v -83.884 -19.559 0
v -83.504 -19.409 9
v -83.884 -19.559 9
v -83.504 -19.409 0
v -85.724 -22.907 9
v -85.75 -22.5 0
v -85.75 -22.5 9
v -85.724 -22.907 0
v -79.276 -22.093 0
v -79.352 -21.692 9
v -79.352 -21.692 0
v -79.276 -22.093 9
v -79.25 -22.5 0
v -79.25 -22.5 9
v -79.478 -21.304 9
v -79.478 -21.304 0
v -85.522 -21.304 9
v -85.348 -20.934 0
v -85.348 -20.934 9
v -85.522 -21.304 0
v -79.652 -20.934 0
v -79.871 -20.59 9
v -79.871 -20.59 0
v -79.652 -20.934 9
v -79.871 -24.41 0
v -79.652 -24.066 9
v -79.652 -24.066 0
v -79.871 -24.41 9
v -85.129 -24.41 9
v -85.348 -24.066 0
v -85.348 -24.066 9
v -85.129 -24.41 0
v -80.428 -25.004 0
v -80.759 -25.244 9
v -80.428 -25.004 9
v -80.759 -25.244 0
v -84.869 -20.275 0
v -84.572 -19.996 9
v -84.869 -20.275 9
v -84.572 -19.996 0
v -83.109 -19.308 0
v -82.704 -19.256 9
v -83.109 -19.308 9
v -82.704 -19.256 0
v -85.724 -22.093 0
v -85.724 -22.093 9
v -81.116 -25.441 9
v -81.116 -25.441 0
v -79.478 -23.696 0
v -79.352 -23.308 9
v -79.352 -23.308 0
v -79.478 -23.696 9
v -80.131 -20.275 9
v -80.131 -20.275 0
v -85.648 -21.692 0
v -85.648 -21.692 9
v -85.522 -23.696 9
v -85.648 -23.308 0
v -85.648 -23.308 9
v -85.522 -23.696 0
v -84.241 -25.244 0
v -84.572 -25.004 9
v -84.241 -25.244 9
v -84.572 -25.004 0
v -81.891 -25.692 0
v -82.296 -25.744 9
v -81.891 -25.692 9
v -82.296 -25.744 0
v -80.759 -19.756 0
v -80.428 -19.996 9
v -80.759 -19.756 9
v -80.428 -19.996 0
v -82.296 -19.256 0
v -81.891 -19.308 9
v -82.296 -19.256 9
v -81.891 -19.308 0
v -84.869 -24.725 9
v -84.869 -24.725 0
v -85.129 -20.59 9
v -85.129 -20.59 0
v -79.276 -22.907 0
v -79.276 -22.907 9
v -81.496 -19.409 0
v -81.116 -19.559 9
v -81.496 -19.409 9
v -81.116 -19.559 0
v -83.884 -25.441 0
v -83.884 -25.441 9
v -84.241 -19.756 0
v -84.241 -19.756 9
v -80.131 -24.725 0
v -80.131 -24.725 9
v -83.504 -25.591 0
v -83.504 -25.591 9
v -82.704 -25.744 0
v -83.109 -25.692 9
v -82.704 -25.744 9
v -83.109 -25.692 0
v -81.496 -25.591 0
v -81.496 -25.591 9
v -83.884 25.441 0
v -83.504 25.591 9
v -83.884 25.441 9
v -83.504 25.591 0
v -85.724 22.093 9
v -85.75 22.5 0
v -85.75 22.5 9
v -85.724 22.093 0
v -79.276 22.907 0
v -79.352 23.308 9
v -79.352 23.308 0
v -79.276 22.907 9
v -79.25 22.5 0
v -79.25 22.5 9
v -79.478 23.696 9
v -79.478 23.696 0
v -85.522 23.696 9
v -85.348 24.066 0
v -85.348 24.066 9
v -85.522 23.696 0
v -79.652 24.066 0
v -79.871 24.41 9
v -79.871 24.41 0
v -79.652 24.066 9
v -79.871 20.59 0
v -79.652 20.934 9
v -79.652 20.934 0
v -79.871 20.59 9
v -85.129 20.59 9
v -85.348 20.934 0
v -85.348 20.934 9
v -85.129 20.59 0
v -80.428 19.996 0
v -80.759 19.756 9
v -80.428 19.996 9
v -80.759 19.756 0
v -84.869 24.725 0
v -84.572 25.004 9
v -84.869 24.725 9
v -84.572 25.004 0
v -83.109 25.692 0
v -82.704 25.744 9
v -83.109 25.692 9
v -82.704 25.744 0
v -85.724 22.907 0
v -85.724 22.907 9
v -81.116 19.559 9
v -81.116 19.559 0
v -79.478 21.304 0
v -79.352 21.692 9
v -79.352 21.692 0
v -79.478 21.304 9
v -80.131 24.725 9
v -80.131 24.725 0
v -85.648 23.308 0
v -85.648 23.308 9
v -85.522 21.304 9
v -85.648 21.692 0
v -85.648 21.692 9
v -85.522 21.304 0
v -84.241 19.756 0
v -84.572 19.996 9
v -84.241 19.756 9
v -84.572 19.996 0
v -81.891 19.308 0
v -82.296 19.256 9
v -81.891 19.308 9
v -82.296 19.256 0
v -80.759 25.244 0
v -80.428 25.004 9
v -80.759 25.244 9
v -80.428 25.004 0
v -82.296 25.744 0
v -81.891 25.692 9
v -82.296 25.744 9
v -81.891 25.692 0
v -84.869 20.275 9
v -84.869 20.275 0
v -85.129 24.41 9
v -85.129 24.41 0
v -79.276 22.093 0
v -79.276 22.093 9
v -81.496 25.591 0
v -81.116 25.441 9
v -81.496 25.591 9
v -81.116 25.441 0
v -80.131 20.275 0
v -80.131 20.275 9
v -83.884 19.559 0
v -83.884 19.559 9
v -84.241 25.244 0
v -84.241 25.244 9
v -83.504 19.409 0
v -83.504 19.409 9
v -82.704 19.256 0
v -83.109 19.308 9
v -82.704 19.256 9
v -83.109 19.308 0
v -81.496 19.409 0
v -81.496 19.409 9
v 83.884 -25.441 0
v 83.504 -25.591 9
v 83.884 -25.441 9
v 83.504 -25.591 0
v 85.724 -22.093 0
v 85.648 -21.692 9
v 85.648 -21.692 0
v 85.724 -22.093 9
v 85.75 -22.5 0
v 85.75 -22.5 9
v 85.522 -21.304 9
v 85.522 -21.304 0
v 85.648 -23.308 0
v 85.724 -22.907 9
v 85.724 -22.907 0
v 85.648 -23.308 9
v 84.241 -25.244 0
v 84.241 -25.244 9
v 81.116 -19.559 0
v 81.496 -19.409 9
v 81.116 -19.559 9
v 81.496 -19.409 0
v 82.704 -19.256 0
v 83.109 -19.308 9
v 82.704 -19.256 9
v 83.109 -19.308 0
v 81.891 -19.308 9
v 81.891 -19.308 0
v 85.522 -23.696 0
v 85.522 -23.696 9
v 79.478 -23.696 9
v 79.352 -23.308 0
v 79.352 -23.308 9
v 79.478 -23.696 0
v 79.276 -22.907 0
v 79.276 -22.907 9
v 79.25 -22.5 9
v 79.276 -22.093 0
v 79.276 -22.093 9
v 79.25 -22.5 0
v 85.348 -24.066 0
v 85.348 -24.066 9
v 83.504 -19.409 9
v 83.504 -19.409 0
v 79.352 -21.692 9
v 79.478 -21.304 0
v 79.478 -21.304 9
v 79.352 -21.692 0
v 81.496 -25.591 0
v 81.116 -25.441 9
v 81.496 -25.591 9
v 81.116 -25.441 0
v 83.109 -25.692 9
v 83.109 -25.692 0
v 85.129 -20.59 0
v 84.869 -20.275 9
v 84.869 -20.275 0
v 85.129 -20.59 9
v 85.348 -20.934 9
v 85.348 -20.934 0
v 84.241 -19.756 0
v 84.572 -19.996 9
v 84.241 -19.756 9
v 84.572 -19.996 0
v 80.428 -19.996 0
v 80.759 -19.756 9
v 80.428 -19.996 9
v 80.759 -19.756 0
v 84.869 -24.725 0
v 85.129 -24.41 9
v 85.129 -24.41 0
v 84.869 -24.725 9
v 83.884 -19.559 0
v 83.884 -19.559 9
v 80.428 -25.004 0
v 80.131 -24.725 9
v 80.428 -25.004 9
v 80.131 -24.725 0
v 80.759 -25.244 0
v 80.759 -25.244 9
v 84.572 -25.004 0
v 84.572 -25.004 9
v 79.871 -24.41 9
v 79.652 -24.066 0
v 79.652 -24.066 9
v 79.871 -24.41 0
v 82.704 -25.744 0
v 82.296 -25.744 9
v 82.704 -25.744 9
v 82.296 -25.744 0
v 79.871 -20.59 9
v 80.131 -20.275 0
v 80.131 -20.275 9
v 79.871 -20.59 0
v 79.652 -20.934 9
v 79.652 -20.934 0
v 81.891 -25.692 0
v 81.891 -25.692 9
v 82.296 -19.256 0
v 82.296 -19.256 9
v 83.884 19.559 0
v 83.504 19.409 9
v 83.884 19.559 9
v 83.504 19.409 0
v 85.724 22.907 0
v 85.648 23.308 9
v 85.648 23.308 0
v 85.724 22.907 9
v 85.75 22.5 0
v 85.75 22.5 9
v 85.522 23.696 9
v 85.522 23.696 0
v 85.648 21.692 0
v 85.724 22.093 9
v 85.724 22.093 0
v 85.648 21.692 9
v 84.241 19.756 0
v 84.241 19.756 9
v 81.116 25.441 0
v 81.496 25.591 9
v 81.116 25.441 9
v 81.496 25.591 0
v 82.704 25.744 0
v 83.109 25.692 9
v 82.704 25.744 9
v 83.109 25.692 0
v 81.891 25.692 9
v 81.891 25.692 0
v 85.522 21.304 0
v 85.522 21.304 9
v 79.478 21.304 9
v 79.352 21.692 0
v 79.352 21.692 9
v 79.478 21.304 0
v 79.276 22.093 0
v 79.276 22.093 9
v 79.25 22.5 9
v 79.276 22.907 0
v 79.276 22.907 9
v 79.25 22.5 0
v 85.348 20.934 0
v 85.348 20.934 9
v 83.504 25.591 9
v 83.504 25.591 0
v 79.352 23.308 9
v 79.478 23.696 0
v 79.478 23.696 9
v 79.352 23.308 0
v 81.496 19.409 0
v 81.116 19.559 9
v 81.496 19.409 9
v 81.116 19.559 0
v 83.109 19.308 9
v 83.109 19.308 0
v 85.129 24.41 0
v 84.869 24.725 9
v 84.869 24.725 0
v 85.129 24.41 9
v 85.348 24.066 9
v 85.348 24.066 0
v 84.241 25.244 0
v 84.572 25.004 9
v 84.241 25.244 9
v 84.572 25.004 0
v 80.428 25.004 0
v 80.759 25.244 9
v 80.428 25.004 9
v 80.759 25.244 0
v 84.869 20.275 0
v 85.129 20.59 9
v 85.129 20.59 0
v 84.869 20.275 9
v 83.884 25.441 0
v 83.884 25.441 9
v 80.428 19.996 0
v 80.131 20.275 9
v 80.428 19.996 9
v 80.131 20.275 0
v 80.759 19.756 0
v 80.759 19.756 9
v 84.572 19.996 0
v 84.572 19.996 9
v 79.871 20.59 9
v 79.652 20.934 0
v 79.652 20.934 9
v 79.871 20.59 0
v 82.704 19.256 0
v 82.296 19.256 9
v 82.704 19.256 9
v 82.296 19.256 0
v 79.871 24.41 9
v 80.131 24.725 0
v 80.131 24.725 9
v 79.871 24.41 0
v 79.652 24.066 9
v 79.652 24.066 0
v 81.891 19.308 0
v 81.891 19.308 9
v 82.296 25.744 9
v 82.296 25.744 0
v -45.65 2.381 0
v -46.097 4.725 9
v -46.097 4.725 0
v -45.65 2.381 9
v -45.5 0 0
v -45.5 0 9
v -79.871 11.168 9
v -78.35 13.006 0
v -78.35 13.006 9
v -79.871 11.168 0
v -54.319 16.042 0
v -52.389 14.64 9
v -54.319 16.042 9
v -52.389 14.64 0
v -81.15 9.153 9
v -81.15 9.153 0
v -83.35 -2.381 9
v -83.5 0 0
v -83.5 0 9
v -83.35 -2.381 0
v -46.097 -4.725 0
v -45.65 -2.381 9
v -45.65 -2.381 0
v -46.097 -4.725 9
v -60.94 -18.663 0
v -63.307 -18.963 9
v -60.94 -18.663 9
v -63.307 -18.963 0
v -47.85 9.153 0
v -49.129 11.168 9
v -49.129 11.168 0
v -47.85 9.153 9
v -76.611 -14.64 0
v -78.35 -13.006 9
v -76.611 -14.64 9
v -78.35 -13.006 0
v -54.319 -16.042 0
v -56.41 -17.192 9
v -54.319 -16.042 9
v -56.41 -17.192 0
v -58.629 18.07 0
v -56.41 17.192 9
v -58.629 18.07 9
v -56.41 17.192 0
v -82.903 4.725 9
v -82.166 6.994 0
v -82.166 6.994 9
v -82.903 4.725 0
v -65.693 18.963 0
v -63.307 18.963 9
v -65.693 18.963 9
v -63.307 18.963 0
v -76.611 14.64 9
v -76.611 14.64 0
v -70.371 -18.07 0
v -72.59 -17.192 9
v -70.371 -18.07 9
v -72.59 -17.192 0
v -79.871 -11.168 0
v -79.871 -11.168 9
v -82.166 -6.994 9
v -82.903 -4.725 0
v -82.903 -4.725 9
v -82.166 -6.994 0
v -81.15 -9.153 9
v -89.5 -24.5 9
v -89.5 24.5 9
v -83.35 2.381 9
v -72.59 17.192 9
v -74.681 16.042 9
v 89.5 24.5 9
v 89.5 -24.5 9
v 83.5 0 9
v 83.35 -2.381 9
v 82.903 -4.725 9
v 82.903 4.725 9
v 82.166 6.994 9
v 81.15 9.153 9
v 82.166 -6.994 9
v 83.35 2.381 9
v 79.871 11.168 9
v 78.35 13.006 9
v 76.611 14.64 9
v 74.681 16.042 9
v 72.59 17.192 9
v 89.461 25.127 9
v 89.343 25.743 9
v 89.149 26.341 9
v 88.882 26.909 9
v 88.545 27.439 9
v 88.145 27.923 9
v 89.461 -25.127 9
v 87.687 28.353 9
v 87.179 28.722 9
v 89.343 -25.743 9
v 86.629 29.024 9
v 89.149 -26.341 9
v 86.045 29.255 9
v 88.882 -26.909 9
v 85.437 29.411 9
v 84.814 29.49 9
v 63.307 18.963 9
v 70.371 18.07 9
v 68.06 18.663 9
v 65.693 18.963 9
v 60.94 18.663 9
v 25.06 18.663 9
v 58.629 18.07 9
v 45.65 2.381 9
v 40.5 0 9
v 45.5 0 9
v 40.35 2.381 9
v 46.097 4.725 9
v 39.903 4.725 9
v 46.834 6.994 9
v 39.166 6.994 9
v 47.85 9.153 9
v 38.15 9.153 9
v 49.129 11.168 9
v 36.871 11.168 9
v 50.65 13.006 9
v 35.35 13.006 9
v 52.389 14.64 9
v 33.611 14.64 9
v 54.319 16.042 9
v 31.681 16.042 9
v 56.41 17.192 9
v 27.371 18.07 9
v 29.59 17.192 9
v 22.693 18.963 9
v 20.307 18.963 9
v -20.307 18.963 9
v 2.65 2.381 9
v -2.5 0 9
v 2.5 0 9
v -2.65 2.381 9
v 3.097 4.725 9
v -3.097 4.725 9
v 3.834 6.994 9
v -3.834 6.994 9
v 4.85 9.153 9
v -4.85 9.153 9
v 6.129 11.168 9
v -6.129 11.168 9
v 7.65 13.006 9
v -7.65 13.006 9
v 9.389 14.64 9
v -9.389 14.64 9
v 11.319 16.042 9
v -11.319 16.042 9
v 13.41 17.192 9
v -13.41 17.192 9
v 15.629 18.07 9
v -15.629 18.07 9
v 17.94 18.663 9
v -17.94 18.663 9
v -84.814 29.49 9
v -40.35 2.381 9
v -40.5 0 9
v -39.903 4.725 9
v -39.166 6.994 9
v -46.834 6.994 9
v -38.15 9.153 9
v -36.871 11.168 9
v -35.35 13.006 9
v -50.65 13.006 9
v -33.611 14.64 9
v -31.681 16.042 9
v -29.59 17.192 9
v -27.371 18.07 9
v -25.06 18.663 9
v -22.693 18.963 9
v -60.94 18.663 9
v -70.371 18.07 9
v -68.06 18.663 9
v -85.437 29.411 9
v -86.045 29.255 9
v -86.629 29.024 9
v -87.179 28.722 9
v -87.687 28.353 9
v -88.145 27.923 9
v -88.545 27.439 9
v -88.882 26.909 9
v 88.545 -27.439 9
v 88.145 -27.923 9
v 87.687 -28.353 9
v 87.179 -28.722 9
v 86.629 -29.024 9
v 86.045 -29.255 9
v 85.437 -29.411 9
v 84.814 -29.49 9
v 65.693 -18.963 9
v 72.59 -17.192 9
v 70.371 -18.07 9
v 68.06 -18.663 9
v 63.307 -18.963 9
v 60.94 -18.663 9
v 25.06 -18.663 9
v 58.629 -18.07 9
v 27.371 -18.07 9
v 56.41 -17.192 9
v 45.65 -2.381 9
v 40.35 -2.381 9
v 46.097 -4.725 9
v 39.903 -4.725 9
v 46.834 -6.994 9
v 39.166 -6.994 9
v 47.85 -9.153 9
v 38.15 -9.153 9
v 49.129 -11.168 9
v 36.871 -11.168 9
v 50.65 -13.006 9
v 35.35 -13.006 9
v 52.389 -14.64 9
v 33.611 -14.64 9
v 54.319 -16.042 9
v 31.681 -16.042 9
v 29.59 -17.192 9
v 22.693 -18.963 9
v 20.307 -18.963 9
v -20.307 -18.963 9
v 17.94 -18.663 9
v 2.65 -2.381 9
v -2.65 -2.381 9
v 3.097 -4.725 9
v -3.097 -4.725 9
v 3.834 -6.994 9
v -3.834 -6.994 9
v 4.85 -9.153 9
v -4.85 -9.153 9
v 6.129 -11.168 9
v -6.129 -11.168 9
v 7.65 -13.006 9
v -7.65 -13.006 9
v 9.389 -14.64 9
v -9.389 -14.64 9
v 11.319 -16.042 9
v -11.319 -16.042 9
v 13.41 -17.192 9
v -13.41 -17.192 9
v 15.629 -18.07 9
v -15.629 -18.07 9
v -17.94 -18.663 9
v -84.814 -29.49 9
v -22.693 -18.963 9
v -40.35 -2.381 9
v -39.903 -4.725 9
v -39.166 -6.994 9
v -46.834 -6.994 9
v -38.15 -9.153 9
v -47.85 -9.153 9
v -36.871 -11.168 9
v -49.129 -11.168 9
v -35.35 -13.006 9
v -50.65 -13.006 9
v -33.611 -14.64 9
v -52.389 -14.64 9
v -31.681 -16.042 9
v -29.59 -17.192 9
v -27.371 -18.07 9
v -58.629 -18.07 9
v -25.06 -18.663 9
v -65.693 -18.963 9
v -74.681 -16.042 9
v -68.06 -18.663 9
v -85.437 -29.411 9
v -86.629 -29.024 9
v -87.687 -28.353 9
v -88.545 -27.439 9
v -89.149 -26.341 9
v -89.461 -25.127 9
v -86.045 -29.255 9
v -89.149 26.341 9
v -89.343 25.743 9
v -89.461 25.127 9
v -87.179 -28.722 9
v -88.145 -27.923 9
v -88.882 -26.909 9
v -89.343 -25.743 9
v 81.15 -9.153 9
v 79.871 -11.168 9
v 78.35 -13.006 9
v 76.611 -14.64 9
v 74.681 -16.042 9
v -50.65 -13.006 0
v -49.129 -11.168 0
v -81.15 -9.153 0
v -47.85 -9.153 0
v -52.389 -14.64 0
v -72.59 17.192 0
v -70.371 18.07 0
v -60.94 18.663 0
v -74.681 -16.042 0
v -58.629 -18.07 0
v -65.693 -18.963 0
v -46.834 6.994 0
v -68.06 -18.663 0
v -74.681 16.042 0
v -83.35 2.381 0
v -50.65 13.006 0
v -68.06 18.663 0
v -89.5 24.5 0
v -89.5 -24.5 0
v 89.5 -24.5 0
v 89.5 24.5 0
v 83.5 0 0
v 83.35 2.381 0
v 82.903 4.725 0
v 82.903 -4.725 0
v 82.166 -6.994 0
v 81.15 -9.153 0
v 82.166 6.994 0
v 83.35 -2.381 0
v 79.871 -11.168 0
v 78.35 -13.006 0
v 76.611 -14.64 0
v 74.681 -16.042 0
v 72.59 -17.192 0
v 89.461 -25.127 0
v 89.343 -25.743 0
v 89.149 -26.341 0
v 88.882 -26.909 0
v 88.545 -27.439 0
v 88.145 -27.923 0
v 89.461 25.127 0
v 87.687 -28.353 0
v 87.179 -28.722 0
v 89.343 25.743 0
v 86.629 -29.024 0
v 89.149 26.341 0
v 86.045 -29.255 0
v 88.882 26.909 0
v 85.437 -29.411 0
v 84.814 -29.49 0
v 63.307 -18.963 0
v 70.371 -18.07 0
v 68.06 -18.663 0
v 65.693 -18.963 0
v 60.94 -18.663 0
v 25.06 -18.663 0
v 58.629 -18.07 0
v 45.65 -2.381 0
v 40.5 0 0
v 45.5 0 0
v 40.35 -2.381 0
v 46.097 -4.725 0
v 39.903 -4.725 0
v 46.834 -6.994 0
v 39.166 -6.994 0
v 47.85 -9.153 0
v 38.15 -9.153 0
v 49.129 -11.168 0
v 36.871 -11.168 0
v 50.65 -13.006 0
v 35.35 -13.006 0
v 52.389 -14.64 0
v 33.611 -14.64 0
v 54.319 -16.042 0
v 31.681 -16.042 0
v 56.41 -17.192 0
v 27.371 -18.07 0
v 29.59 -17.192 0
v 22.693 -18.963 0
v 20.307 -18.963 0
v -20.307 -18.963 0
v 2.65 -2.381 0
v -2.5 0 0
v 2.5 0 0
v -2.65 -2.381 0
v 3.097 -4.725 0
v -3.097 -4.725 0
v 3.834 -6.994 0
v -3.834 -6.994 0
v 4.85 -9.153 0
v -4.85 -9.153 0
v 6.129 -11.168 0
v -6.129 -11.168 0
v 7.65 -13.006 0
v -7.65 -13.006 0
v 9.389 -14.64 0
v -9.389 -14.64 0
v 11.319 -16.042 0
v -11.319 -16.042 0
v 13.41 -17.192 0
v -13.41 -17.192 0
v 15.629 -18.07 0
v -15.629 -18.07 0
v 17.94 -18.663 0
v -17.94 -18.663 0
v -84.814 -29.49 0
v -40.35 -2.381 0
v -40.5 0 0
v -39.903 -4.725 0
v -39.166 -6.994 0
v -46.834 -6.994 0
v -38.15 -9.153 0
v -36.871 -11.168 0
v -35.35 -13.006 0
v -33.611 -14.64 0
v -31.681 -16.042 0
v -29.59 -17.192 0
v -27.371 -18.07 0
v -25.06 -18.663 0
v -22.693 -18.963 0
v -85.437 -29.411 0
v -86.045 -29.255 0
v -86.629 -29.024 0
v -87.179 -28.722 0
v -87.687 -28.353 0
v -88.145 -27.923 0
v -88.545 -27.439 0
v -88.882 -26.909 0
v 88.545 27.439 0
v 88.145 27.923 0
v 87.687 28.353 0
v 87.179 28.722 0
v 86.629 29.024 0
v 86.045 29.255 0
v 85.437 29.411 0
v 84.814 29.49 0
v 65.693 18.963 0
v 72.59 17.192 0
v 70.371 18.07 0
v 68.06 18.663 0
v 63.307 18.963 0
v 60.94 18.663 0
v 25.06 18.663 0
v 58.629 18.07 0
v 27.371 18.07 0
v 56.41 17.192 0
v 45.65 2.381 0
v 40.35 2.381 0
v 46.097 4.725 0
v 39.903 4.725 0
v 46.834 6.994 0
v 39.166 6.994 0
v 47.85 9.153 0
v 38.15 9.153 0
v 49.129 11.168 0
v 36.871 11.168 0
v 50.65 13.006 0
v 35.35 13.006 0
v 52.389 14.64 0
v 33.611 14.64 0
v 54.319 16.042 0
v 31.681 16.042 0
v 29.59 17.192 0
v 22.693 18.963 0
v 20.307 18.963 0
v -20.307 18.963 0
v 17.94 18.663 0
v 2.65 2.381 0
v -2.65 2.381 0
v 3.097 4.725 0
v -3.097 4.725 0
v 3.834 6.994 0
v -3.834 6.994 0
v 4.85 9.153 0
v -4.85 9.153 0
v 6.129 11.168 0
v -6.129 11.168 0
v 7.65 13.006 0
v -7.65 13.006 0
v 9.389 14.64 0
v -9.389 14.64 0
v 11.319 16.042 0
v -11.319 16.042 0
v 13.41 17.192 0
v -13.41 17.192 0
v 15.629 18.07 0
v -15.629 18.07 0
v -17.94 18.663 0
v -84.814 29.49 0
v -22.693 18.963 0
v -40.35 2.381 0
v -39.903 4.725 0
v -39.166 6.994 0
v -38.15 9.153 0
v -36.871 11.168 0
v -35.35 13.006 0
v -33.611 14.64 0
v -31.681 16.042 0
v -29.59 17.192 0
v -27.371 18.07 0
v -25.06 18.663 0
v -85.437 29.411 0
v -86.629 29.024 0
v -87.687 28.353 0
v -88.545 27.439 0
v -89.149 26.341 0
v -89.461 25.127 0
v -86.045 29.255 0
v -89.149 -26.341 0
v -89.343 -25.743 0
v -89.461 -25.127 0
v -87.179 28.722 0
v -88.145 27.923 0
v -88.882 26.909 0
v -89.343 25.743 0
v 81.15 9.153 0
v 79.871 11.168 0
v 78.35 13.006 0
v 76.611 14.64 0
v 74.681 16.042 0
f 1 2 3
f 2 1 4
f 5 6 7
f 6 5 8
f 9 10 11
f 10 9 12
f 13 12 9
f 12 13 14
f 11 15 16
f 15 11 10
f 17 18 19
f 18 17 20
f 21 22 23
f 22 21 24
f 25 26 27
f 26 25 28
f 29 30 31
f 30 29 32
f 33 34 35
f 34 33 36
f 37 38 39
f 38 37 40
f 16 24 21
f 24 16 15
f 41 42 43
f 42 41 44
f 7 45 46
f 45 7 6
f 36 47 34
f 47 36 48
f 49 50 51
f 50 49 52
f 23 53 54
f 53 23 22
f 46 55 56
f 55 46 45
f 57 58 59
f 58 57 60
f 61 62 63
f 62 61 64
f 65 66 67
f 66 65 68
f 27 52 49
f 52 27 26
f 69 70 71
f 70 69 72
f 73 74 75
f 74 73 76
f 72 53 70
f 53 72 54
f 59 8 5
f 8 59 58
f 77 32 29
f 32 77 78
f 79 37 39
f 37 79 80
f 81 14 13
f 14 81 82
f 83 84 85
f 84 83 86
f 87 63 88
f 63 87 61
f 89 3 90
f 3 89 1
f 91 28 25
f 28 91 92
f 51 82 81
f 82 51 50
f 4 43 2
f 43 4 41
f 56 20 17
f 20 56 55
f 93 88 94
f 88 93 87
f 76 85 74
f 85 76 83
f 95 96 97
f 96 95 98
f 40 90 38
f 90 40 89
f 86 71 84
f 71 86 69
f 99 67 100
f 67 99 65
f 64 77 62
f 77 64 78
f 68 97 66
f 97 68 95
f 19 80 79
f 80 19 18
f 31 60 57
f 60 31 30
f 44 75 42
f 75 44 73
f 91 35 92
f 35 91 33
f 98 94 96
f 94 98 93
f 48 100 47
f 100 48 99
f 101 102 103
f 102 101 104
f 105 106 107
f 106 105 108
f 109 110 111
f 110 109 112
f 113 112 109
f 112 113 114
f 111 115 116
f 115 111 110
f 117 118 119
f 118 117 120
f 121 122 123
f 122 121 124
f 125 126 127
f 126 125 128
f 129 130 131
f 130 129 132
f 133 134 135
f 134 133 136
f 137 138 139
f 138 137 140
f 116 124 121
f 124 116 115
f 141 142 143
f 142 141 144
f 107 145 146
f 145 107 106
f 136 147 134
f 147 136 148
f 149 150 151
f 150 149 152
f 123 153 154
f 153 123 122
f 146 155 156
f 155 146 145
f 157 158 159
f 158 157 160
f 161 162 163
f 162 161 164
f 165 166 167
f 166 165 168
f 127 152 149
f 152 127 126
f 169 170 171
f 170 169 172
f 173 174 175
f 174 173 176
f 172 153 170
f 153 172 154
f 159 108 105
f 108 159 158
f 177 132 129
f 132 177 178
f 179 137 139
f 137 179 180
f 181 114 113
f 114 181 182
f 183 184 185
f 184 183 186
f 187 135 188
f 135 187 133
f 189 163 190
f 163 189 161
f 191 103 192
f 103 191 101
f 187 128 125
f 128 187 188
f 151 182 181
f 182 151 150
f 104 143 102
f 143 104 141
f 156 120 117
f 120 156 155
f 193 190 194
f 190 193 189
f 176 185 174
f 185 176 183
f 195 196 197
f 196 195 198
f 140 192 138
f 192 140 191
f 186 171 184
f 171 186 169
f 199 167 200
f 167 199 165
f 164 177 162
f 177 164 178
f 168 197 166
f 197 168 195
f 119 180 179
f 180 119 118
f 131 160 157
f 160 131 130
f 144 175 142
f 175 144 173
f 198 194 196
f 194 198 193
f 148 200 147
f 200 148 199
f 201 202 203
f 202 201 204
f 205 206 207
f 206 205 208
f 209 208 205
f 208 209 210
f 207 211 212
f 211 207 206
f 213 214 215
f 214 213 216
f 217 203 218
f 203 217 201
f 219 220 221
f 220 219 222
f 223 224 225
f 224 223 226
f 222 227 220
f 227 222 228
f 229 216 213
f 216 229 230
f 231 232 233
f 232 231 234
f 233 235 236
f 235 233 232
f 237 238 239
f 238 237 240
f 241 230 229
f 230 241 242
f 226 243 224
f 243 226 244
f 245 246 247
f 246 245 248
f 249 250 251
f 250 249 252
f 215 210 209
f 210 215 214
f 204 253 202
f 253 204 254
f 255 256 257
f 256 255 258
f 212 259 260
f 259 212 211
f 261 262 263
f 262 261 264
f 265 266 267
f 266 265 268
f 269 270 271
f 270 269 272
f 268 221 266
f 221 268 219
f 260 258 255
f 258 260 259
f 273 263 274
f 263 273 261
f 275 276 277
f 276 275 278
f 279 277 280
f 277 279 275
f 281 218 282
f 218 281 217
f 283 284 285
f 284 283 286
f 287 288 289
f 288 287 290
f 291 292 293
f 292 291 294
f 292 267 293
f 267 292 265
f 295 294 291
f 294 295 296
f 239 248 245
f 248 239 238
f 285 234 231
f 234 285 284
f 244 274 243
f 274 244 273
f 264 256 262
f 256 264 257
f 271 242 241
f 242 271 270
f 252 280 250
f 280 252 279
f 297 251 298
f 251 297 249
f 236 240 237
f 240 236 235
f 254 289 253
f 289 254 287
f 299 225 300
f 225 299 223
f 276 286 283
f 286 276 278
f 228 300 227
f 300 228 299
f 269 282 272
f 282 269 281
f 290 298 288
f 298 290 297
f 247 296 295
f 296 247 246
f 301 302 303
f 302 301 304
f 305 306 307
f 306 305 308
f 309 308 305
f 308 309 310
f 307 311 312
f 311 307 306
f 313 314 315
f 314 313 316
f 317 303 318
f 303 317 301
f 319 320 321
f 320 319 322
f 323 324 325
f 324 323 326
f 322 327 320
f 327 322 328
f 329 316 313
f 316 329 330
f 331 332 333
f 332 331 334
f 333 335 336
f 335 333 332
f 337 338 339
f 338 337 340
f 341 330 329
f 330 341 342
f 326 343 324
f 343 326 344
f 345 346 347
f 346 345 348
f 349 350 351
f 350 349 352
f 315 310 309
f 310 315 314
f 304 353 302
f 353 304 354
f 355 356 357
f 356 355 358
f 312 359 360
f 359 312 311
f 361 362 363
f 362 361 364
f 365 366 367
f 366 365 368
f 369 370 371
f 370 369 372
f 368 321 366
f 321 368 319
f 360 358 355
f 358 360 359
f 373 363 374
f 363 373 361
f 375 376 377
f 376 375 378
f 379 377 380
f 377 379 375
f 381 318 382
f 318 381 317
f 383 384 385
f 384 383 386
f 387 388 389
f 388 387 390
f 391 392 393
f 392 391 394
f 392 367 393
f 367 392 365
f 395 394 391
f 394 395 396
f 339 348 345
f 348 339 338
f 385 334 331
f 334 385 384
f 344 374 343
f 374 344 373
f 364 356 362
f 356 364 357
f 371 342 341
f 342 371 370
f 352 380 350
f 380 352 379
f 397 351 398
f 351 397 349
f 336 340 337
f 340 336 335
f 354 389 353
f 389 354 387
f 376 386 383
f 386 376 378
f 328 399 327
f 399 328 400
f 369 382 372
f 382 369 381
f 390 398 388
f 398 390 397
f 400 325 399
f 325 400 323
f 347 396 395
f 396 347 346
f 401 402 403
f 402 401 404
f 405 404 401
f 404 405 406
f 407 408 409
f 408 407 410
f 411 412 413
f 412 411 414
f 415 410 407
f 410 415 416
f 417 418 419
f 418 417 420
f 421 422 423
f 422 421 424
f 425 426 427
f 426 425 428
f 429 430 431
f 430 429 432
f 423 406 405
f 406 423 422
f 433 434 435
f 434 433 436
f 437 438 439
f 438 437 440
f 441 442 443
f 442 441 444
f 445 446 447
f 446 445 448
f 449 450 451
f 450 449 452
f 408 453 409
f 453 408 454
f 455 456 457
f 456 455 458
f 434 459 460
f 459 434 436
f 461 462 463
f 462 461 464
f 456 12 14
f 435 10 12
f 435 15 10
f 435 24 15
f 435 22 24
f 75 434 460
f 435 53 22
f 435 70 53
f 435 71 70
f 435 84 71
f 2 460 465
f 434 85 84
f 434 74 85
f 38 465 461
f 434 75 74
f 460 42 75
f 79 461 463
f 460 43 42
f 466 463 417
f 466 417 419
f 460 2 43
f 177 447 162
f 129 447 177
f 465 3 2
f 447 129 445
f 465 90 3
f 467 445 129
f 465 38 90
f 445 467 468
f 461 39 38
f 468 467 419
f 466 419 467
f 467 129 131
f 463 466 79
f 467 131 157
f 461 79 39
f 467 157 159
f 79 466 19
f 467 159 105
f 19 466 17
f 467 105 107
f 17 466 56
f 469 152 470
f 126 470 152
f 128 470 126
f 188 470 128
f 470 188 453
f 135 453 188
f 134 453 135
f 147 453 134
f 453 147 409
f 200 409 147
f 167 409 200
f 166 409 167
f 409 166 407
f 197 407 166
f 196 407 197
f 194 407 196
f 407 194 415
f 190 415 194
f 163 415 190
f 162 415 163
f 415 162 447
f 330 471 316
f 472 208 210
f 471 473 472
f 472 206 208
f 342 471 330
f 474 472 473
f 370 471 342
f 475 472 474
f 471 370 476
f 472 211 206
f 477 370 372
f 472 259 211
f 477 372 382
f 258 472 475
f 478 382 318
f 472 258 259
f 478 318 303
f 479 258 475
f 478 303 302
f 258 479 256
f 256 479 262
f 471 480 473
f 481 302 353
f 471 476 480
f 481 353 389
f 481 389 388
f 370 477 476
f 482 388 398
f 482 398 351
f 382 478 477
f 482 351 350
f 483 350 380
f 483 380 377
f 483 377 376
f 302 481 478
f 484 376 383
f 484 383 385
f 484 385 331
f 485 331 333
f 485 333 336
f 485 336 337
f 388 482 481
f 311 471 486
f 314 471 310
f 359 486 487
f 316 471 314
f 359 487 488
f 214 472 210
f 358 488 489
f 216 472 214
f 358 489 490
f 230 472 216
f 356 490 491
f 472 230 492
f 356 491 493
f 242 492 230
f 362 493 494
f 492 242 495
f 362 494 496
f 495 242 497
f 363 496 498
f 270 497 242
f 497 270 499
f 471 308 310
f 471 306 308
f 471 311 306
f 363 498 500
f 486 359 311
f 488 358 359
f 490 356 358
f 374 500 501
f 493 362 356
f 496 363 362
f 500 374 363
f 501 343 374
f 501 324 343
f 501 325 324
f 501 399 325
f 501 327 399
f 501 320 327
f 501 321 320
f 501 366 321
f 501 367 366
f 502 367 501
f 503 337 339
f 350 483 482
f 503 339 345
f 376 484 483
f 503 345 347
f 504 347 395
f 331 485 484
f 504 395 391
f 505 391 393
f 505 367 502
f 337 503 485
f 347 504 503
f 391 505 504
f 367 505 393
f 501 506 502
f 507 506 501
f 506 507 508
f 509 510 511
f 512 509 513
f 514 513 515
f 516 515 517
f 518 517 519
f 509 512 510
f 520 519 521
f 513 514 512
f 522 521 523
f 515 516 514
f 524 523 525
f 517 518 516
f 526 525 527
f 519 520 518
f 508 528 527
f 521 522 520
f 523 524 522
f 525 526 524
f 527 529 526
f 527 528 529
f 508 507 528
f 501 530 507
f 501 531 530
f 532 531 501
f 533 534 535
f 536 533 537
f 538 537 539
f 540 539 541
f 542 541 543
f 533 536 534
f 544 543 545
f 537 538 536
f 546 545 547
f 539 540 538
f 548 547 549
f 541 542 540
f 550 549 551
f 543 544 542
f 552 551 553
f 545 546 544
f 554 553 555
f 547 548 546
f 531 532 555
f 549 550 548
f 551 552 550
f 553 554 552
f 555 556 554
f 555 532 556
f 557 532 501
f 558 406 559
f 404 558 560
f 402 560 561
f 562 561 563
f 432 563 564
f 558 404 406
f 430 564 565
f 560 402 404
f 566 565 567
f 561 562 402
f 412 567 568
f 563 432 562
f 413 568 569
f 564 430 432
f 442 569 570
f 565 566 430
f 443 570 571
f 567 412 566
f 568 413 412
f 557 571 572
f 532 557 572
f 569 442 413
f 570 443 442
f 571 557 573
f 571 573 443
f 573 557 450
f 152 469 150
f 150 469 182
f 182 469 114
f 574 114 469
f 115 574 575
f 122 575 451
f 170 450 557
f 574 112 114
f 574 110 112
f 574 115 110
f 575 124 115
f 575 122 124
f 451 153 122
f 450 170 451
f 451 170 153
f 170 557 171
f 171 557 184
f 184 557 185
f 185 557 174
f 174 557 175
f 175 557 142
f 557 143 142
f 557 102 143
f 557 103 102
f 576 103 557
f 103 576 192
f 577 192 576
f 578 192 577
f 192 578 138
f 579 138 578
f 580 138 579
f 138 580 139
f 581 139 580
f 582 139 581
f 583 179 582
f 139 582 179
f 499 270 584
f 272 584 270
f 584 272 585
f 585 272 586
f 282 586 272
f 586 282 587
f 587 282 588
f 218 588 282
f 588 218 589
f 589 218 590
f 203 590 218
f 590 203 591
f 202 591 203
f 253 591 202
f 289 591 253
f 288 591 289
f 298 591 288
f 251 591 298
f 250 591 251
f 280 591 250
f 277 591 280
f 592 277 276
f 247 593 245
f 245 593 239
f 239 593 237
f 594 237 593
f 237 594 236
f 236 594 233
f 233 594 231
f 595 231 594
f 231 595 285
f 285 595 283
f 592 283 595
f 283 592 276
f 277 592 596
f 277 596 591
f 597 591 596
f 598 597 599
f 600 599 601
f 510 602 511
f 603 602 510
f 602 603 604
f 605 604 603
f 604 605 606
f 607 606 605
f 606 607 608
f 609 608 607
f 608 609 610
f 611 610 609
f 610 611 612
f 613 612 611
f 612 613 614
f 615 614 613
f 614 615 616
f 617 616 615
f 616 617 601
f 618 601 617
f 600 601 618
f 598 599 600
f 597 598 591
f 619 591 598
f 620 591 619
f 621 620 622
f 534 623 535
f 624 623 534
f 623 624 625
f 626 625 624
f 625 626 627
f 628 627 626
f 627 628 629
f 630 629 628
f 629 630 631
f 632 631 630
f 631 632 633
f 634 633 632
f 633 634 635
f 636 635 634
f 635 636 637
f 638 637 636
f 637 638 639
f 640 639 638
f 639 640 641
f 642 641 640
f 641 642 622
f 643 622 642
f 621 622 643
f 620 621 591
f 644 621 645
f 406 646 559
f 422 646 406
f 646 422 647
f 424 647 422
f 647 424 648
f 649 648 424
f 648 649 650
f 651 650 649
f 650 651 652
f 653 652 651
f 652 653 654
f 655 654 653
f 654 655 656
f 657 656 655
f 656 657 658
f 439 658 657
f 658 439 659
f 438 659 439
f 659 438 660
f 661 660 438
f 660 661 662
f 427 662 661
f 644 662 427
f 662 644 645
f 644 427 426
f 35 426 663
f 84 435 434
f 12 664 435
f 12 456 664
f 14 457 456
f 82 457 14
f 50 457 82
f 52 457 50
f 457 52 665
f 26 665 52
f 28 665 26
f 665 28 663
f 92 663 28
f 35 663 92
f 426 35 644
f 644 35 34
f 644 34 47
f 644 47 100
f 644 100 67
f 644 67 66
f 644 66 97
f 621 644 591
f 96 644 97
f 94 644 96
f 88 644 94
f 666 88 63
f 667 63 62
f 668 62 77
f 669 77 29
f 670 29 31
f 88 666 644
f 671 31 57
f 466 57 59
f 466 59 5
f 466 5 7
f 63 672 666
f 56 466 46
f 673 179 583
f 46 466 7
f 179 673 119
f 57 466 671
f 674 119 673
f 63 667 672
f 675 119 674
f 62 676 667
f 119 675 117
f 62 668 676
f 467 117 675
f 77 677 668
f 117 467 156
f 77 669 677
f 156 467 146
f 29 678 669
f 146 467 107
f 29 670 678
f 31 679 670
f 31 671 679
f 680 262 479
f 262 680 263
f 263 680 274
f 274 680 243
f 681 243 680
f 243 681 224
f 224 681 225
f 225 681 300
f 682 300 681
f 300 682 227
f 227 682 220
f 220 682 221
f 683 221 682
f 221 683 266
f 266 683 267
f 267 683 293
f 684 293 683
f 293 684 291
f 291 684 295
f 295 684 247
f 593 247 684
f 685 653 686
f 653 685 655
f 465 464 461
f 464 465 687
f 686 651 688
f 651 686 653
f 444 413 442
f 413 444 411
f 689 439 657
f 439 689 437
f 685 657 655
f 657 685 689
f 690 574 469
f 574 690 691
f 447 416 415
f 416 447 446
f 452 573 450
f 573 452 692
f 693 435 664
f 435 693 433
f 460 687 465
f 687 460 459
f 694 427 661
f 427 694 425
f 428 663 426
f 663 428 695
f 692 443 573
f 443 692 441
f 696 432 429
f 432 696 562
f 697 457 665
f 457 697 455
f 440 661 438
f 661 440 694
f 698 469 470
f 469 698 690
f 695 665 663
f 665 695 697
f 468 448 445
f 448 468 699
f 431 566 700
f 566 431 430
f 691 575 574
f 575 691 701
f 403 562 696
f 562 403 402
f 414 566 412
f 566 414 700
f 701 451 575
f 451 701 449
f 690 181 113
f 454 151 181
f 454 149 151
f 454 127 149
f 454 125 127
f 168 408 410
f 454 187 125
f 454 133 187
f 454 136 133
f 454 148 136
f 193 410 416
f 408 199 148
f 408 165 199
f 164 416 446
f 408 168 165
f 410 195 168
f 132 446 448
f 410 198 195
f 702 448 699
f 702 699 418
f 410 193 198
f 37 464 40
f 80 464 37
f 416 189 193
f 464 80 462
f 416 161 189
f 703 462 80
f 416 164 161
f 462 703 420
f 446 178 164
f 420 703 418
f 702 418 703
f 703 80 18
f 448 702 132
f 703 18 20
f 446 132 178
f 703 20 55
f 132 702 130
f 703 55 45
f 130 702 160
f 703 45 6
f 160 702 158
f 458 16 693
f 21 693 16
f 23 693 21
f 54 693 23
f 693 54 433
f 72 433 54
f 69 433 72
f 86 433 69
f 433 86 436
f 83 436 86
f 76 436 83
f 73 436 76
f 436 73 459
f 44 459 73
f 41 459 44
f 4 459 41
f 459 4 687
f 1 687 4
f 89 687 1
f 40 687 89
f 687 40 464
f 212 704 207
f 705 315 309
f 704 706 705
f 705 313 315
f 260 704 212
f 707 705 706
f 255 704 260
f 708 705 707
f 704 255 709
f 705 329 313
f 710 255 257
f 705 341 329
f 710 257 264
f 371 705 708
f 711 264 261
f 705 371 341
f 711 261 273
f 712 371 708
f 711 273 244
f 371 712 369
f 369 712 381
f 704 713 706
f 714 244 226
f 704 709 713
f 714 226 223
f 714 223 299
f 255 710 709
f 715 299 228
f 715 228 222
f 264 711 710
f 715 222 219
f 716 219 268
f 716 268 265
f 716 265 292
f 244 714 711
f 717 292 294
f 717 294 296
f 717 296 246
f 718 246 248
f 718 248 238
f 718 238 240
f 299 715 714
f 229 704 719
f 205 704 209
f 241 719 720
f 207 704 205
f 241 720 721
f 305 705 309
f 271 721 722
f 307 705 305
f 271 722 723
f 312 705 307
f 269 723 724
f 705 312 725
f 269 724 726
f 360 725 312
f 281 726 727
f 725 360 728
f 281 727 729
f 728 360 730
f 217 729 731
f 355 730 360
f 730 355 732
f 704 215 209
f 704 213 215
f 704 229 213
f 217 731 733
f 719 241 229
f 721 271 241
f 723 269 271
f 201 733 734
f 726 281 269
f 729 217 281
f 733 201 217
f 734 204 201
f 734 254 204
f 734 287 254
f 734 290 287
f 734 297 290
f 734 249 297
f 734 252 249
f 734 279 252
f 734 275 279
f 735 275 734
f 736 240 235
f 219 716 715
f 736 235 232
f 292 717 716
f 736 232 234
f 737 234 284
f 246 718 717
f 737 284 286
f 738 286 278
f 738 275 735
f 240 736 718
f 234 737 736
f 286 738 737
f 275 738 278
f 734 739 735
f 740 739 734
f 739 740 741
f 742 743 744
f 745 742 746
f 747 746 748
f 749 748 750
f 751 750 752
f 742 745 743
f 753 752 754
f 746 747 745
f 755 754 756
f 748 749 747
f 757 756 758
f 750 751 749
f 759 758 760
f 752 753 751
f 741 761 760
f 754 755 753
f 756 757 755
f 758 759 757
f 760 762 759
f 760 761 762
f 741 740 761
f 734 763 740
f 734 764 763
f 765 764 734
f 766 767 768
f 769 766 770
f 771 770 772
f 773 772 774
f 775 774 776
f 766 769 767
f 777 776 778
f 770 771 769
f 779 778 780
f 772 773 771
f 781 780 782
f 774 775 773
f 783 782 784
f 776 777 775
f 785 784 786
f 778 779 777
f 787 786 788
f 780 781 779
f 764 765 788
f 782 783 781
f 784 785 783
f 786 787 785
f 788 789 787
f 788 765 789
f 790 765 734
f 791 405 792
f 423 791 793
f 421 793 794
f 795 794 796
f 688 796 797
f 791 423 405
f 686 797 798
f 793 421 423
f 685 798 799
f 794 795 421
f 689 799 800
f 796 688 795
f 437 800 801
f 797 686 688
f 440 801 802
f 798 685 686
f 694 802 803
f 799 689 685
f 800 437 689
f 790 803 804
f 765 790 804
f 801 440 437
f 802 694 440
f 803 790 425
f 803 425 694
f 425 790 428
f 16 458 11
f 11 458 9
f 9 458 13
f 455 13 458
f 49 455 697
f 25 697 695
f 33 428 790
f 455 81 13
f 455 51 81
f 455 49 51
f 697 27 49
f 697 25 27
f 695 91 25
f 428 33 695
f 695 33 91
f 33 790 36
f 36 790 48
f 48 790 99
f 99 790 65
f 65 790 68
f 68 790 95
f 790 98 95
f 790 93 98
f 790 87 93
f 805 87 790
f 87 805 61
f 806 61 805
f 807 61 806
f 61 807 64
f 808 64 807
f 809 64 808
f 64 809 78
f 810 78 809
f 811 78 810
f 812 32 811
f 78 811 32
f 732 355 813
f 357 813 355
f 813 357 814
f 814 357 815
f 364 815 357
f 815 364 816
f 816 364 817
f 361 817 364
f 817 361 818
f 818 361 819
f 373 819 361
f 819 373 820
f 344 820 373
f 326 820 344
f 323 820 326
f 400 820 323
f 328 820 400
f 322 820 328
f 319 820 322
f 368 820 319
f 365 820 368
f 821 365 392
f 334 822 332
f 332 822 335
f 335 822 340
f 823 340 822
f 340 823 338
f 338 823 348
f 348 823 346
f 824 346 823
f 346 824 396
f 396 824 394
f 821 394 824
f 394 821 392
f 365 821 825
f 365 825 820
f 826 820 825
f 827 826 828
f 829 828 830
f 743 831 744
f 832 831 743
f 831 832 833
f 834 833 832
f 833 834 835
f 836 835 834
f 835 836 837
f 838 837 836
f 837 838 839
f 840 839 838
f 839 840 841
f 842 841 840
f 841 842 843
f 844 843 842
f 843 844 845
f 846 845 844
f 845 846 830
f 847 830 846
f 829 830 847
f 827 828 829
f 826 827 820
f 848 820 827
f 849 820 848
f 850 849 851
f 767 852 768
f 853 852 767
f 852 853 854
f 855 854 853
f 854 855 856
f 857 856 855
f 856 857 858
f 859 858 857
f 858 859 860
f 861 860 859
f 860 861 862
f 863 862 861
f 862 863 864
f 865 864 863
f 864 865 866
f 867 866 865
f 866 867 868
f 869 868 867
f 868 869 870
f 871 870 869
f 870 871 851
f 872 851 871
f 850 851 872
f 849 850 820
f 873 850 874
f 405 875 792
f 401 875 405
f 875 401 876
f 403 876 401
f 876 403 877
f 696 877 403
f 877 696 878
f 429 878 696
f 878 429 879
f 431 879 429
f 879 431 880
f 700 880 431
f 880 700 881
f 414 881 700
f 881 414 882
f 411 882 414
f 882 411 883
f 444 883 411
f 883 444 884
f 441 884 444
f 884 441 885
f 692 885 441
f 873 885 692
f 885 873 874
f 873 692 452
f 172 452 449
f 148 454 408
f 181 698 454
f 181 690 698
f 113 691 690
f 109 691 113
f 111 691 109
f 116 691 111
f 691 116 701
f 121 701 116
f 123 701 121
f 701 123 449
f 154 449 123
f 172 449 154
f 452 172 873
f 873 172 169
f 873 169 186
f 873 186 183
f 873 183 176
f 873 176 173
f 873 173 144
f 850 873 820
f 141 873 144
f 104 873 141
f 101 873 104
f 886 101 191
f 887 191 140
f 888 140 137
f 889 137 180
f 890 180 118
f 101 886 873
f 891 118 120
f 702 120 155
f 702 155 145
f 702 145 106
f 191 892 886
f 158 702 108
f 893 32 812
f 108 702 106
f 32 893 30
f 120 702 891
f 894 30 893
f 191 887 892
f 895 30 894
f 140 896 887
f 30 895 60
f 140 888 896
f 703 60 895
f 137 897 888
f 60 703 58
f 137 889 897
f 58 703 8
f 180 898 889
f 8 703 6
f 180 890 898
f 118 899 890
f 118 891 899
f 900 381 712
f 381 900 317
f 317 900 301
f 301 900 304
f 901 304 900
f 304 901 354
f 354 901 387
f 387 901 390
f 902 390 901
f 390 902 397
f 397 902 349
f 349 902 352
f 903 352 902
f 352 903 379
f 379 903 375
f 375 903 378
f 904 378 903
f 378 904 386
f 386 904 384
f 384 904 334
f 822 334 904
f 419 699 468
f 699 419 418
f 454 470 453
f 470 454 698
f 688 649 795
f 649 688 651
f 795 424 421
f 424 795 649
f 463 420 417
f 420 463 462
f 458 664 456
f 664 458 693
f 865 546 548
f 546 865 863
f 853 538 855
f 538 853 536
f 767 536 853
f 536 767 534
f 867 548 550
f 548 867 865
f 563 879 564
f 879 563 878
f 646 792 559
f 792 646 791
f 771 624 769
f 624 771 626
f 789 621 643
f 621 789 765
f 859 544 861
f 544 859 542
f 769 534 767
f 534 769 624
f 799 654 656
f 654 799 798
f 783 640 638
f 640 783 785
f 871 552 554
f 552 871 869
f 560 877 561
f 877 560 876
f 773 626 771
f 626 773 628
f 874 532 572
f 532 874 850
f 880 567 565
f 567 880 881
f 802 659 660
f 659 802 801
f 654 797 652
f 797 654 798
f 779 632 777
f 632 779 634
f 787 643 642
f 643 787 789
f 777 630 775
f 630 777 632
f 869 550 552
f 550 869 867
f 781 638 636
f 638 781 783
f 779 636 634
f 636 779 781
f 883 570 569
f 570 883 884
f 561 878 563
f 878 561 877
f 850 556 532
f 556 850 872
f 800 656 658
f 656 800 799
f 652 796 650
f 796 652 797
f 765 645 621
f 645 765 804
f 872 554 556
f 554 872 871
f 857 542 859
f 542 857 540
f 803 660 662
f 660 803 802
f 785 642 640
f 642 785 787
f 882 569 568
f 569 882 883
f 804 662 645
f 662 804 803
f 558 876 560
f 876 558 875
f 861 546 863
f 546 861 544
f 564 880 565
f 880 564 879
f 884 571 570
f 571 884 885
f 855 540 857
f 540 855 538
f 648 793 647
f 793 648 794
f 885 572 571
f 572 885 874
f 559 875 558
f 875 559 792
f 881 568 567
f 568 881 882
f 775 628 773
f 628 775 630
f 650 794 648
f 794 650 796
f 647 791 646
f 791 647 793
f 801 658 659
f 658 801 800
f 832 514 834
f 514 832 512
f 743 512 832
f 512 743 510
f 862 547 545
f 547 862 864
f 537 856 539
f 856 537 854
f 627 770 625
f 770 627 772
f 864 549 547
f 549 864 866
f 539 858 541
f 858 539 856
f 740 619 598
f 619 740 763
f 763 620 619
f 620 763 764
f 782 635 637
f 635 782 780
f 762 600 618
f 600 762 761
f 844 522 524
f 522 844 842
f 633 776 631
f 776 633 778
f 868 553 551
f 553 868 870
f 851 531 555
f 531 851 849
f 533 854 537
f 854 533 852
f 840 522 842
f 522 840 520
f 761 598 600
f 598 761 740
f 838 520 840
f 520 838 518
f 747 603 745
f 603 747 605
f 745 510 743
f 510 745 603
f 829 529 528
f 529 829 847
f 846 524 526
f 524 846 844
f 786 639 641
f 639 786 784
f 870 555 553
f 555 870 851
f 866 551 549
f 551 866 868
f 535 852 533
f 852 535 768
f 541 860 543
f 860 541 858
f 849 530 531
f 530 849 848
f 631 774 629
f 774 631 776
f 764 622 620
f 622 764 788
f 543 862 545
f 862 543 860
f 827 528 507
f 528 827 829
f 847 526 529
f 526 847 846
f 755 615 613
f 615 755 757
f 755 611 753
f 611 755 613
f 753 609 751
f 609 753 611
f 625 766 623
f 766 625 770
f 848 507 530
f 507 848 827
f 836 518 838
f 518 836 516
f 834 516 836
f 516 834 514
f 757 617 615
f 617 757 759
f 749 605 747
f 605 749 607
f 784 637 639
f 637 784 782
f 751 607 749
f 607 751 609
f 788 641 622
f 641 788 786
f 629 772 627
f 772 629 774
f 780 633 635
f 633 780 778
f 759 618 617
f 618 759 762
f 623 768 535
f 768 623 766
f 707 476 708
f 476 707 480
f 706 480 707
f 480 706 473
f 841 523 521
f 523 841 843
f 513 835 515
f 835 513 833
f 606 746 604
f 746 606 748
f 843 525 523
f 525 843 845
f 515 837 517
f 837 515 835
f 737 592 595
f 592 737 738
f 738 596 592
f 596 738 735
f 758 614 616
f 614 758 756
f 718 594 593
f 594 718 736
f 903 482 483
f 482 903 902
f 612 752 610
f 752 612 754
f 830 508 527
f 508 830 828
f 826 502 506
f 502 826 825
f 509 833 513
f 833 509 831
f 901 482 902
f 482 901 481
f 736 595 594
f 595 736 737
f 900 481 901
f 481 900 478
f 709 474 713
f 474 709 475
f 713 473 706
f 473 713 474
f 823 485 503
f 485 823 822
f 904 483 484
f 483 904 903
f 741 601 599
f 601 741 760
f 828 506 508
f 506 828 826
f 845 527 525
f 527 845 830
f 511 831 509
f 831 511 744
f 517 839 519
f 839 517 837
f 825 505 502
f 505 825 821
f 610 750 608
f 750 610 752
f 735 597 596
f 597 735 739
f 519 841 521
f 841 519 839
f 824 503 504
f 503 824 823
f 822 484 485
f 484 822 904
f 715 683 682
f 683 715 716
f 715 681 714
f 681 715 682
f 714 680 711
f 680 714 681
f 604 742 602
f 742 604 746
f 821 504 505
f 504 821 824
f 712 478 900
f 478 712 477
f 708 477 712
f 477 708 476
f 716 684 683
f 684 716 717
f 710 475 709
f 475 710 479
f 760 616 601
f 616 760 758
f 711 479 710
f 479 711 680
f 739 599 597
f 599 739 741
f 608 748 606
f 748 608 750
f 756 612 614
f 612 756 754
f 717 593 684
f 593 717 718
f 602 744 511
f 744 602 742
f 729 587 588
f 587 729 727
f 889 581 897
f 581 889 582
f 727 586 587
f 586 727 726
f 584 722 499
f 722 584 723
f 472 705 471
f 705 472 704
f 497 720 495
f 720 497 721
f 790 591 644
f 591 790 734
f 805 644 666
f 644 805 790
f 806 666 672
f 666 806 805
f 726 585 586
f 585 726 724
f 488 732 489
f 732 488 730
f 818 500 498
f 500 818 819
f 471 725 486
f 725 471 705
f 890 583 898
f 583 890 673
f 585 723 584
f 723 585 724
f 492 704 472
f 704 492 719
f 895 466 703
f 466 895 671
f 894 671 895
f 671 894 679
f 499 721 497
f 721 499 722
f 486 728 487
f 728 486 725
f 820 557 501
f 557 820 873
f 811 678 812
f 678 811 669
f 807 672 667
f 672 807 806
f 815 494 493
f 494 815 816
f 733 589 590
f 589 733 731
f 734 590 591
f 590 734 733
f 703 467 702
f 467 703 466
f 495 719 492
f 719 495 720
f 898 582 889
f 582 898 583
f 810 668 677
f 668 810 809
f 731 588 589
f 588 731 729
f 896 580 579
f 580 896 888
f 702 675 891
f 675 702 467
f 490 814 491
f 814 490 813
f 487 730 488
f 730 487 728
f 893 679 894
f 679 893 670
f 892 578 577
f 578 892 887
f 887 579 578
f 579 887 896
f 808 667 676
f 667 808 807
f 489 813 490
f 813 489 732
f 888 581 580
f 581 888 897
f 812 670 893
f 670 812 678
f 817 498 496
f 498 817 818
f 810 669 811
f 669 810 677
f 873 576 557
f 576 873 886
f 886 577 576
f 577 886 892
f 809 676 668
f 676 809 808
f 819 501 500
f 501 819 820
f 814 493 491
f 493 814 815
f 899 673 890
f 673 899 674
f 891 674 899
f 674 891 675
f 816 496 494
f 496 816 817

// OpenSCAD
$fn = 50;


difference() {
	union() {
		hull() {
			translate(v = [-84.5000000000, 24.5000000000, 0]) {
				cylinder(h = 9, r = 5);
			}
			translate(v = [84.5000000000, 24.5000000000, 0]) {
				cylinder(h = 9, r = 5);
			}
			translate(v = [-84.5000000000, -24.5000000000, 0]) {
				cylinder(h = 9, r = 5);
			}
			translate(v = [84.5000000000, -24.5000000000, 0]) {
				cylinder(h = 9, r = 5);
			}
		}
	}
	union() {
		#translate(v = [-82.5000000000, -22.5000000000, -100.0000000000]) {
			cylinder(h = 200, r = 3.2500000000);
		}
		#translate(v = [-82.5000000000, 22.5000000000, -100.0000000000]) {
			cylinder(h = 200, r = 3.2500000000);
		}
		#translate(v = [82.5000000000, -22.5000000000, -100.0000000000]) {
			cylinder(h = 200, r = 3.2500000000);
		}
		#translate(v = [82.5000000000, 22.5000000000, -100.0000000000]) {
			cylinder(h = 200, r = 3.2500000000);
		}
		#translate(v = [-64.5000000000, 0, 0]) {
			cylinder(h = 9, r = 19.0000000000);
		}
		#translate(v = [-21.5000000000, 0, 0]) {
			cylinder(h = 9, r = 19.0000000000);
		}
		#translate(v = [21.5000000000, 0, 0]) {
			cylinder(h = 9, r = 19.0000000000);
		}
		#translate(v = [64.5000000000, 0, 0]) {
			cylinder(h = 9, r = 19.0000000000);
		}
	}
}
